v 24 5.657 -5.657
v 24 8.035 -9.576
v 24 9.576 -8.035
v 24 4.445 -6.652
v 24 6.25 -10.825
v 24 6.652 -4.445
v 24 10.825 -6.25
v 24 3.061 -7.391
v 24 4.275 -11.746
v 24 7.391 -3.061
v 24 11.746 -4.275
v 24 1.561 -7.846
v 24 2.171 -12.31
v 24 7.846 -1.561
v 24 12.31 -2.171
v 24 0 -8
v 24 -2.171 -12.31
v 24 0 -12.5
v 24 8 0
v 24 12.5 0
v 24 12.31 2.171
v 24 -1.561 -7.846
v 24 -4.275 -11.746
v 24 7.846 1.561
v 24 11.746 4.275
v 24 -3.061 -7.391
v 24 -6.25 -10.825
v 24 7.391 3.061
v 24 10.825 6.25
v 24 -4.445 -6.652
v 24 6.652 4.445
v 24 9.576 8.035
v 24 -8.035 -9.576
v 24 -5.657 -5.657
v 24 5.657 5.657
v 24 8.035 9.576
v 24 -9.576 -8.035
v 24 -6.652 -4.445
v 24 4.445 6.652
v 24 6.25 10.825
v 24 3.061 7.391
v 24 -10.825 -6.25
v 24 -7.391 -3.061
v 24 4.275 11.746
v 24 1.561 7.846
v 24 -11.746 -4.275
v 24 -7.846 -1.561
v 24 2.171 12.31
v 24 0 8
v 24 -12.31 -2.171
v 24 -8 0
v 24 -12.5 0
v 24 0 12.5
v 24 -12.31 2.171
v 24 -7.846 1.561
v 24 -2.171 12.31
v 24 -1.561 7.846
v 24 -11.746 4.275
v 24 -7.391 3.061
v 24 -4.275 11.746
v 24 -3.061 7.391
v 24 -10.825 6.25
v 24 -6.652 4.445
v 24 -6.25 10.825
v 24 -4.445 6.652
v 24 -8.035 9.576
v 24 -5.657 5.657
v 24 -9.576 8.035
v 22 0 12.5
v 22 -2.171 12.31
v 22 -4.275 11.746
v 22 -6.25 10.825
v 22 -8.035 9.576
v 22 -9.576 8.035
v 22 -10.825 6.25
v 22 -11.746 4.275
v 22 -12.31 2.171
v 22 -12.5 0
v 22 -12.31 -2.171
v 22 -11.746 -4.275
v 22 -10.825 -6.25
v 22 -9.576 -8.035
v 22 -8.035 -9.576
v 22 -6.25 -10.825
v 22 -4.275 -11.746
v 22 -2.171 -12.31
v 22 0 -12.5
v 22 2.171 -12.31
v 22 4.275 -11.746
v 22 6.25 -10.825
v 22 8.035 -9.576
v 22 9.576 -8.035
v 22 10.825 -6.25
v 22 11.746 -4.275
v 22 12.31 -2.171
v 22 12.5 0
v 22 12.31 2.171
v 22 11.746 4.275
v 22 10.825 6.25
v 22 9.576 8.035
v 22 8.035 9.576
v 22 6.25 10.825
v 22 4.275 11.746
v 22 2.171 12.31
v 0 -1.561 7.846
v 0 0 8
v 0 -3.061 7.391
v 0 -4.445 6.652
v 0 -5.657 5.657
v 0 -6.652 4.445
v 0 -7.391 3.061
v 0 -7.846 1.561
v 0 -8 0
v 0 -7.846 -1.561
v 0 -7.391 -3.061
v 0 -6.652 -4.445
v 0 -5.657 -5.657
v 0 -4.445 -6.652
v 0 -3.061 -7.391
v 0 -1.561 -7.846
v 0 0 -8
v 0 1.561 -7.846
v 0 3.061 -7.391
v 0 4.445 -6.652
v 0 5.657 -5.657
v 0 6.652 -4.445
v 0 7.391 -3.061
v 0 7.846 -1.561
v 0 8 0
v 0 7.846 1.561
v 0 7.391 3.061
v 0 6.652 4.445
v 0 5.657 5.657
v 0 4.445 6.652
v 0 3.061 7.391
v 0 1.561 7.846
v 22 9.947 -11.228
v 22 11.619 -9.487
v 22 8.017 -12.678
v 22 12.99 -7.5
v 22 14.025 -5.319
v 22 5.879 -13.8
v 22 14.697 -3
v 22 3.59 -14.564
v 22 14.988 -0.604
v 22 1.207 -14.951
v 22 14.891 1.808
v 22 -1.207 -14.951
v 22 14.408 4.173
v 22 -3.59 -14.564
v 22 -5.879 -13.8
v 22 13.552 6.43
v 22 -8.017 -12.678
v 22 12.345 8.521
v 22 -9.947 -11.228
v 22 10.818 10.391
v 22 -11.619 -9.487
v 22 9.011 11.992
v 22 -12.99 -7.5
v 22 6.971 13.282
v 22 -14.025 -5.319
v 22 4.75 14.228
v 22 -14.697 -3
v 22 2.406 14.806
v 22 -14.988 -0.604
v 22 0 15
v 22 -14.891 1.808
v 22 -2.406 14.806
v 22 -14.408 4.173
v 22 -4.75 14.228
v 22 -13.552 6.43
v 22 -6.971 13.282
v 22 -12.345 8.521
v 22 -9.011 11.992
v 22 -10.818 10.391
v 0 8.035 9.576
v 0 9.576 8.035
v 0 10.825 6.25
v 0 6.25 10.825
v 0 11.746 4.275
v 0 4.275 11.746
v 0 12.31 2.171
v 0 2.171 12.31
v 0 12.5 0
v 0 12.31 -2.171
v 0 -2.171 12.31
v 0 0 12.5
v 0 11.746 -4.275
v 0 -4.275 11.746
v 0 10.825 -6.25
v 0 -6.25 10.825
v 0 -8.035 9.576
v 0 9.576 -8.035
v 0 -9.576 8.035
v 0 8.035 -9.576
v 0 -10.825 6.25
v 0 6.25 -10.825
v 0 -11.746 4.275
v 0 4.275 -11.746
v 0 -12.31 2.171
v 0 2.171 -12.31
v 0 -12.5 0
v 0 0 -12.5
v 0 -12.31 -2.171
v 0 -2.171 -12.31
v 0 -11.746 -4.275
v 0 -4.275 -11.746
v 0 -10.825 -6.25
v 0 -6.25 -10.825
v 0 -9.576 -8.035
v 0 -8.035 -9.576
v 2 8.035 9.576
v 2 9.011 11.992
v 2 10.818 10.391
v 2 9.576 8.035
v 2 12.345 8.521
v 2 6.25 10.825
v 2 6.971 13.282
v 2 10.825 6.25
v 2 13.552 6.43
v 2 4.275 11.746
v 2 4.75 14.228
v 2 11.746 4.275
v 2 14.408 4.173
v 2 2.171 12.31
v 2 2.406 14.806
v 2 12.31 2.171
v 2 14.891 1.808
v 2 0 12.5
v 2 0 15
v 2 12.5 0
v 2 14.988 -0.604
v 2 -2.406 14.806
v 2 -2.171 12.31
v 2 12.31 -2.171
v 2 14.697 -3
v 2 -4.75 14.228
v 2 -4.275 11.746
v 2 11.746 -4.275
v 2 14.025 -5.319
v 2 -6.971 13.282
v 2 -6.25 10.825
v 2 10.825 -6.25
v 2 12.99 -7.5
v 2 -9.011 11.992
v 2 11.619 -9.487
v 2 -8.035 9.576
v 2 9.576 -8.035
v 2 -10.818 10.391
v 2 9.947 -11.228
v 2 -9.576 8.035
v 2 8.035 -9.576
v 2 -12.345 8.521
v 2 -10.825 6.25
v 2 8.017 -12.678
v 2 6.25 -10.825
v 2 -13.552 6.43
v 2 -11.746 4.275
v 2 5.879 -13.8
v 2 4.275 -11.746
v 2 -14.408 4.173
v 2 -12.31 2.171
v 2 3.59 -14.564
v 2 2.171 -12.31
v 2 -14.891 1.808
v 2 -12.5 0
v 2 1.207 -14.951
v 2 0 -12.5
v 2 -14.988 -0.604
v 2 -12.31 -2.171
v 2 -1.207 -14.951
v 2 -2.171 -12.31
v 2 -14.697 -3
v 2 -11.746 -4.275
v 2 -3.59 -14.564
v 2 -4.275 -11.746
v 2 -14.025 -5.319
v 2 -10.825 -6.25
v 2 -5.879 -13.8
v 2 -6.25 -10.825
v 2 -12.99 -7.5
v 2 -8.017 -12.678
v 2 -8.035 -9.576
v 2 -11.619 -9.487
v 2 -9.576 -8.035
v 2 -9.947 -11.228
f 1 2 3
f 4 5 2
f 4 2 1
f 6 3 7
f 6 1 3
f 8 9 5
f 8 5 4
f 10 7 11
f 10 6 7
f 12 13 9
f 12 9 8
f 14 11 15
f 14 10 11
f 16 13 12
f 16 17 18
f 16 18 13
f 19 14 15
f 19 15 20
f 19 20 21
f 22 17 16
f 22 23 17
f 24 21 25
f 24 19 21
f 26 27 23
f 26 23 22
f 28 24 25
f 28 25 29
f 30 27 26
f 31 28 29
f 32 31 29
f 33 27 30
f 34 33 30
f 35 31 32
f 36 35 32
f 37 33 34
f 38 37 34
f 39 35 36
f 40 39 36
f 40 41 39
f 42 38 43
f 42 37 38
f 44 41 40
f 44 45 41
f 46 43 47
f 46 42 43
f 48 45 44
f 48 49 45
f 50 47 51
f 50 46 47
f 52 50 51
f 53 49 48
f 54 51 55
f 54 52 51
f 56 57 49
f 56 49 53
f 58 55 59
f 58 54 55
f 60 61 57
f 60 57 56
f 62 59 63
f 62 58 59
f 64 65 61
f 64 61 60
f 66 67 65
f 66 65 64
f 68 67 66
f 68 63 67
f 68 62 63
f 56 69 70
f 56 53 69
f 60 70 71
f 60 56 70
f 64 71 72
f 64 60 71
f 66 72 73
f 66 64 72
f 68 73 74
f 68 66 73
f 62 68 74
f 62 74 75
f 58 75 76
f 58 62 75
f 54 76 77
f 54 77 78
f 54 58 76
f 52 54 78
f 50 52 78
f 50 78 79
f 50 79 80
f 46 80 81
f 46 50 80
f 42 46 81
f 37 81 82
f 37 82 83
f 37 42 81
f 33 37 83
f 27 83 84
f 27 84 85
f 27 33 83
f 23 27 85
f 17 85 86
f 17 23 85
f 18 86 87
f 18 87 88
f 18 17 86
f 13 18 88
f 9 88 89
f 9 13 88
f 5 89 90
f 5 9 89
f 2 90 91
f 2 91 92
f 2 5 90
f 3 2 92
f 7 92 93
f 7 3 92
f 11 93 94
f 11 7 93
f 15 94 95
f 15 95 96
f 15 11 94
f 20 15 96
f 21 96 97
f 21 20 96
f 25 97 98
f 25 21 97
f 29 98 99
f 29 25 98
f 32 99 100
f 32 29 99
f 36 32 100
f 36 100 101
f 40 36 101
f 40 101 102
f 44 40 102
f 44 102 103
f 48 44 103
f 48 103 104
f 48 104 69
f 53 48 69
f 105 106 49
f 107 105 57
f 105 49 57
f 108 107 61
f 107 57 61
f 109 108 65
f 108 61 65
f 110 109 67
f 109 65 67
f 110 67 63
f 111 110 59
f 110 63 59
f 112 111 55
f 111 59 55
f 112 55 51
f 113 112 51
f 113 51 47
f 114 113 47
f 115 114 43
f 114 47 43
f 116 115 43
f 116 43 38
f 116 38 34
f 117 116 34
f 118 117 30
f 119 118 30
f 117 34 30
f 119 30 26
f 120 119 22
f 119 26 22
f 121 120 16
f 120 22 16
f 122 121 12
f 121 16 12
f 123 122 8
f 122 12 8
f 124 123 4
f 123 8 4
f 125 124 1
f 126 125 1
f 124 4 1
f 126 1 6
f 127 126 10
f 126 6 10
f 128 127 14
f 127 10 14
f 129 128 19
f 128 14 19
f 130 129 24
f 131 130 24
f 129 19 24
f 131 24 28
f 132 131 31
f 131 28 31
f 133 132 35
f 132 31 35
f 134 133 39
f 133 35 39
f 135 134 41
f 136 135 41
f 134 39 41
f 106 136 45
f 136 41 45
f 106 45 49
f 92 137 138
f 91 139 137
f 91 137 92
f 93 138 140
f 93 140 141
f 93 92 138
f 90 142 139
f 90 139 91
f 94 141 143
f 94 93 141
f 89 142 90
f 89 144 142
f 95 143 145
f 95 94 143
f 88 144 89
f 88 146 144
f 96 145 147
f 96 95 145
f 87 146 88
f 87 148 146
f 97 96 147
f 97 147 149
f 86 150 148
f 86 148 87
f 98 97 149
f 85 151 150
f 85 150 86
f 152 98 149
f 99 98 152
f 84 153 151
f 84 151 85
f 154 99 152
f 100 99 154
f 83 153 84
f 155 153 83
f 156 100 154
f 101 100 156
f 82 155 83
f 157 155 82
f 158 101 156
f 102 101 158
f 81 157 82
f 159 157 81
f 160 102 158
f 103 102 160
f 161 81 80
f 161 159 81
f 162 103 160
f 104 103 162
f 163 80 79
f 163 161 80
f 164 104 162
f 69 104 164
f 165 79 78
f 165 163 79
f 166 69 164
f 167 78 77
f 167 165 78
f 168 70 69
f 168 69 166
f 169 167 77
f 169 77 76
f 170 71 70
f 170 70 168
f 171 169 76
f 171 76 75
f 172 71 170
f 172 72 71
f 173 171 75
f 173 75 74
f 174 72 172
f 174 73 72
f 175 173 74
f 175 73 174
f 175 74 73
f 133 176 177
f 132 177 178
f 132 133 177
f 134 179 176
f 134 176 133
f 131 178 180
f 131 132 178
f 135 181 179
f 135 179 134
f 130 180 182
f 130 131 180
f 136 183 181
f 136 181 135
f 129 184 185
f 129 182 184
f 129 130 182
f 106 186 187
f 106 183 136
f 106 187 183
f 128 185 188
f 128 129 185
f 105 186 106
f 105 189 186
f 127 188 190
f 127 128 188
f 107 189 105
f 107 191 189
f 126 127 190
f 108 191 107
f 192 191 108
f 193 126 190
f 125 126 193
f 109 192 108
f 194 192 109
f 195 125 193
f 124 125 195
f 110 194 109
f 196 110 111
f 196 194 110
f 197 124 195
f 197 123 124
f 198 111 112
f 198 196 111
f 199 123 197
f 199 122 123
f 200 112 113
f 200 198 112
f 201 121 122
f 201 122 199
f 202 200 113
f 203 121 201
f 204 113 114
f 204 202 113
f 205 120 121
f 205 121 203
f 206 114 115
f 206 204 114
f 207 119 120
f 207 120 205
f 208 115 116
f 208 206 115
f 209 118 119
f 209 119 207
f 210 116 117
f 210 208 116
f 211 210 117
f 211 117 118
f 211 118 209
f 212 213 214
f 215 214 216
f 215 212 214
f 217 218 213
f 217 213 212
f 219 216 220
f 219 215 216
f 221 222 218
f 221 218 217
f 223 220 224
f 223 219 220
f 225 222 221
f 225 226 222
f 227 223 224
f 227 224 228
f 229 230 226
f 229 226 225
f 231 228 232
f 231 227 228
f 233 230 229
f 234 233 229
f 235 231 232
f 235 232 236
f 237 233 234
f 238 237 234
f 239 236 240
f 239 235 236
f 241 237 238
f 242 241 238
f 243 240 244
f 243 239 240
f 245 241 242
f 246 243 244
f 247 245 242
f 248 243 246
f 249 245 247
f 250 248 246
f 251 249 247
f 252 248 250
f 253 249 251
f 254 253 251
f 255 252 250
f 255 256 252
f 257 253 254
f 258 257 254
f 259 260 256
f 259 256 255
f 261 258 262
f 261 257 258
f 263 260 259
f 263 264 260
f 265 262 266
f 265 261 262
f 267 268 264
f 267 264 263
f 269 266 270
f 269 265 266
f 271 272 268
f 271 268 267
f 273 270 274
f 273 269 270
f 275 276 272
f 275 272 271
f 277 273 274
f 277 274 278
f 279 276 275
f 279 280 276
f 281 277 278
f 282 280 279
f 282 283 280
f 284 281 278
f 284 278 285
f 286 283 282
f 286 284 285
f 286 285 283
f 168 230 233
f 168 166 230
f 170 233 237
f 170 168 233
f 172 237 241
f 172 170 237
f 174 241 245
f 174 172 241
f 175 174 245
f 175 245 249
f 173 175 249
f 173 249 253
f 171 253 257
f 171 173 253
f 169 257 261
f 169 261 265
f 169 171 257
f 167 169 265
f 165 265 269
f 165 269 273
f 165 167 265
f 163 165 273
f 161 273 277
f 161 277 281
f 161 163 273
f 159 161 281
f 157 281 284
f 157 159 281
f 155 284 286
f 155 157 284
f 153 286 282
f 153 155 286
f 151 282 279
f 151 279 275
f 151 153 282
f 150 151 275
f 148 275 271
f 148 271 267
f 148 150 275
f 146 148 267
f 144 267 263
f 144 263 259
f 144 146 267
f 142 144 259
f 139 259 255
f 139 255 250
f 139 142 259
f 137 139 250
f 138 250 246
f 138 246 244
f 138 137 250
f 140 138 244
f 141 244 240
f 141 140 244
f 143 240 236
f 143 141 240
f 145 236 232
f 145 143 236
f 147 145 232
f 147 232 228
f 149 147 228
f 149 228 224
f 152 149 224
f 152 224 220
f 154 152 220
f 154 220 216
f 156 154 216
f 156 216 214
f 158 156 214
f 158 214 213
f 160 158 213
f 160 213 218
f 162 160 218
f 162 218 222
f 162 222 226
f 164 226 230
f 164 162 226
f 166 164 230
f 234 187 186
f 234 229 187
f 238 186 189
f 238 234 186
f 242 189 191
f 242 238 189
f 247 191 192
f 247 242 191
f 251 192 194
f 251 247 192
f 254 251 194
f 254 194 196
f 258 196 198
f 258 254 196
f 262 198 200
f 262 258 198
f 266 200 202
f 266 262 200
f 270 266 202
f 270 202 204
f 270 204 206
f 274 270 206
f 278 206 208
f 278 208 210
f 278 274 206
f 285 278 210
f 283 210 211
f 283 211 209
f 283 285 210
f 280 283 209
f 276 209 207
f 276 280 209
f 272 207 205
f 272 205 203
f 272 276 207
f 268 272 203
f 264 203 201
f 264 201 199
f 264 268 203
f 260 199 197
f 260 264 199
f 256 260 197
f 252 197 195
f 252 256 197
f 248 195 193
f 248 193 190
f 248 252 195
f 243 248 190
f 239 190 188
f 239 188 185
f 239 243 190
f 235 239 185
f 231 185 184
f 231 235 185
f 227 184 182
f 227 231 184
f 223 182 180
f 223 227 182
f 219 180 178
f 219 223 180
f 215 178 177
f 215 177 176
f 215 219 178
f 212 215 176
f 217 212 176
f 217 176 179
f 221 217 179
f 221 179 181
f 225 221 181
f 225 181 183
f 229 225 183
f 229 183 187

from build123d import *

# Parameters (mm, degrees)
SKETCH2_W = 24
SKETCH2_H = 8


with BuildPart() as part:
    # Sketch1 → Revolve1 (revolve)
    with BuildSketch(Plane.XY, mode=Mode.PRIVATE) as revolve1_sk:
        Polygon((0, 0), (0, 12.5), (2, 12.5), (2, 15), (22, 15), (22, 12.5), (24, 12.5), (24, 0), align=None)
    revolve(revolve1_sk.sketch.rotate(Axis((-4.047229768, 0, 0), (1, 0, 0)), 90), axis=Axis((-4.047229768, 0, 0), (1, 0, 0)))

    # Sketch2 → Cut-Revolve1 (revolve, cut)
    with BuildSketch(Plane.XY, mode=Mode.PRIVATE) as cut_revolve1_sk:
        with Locations((12, 4)):
            Rectangle(SKETCH2_W, SKETCH2_H)
    revolve(cut_revolve1_sk.sketch.rotate(Axis((-2.968632144, 0, 0), (1, 0, 0)), 90), axis=Axis((-2.968632144, 0, 0), (1, 0, 0)), mode=Mode.SUBTRACT)


solid = part.part
